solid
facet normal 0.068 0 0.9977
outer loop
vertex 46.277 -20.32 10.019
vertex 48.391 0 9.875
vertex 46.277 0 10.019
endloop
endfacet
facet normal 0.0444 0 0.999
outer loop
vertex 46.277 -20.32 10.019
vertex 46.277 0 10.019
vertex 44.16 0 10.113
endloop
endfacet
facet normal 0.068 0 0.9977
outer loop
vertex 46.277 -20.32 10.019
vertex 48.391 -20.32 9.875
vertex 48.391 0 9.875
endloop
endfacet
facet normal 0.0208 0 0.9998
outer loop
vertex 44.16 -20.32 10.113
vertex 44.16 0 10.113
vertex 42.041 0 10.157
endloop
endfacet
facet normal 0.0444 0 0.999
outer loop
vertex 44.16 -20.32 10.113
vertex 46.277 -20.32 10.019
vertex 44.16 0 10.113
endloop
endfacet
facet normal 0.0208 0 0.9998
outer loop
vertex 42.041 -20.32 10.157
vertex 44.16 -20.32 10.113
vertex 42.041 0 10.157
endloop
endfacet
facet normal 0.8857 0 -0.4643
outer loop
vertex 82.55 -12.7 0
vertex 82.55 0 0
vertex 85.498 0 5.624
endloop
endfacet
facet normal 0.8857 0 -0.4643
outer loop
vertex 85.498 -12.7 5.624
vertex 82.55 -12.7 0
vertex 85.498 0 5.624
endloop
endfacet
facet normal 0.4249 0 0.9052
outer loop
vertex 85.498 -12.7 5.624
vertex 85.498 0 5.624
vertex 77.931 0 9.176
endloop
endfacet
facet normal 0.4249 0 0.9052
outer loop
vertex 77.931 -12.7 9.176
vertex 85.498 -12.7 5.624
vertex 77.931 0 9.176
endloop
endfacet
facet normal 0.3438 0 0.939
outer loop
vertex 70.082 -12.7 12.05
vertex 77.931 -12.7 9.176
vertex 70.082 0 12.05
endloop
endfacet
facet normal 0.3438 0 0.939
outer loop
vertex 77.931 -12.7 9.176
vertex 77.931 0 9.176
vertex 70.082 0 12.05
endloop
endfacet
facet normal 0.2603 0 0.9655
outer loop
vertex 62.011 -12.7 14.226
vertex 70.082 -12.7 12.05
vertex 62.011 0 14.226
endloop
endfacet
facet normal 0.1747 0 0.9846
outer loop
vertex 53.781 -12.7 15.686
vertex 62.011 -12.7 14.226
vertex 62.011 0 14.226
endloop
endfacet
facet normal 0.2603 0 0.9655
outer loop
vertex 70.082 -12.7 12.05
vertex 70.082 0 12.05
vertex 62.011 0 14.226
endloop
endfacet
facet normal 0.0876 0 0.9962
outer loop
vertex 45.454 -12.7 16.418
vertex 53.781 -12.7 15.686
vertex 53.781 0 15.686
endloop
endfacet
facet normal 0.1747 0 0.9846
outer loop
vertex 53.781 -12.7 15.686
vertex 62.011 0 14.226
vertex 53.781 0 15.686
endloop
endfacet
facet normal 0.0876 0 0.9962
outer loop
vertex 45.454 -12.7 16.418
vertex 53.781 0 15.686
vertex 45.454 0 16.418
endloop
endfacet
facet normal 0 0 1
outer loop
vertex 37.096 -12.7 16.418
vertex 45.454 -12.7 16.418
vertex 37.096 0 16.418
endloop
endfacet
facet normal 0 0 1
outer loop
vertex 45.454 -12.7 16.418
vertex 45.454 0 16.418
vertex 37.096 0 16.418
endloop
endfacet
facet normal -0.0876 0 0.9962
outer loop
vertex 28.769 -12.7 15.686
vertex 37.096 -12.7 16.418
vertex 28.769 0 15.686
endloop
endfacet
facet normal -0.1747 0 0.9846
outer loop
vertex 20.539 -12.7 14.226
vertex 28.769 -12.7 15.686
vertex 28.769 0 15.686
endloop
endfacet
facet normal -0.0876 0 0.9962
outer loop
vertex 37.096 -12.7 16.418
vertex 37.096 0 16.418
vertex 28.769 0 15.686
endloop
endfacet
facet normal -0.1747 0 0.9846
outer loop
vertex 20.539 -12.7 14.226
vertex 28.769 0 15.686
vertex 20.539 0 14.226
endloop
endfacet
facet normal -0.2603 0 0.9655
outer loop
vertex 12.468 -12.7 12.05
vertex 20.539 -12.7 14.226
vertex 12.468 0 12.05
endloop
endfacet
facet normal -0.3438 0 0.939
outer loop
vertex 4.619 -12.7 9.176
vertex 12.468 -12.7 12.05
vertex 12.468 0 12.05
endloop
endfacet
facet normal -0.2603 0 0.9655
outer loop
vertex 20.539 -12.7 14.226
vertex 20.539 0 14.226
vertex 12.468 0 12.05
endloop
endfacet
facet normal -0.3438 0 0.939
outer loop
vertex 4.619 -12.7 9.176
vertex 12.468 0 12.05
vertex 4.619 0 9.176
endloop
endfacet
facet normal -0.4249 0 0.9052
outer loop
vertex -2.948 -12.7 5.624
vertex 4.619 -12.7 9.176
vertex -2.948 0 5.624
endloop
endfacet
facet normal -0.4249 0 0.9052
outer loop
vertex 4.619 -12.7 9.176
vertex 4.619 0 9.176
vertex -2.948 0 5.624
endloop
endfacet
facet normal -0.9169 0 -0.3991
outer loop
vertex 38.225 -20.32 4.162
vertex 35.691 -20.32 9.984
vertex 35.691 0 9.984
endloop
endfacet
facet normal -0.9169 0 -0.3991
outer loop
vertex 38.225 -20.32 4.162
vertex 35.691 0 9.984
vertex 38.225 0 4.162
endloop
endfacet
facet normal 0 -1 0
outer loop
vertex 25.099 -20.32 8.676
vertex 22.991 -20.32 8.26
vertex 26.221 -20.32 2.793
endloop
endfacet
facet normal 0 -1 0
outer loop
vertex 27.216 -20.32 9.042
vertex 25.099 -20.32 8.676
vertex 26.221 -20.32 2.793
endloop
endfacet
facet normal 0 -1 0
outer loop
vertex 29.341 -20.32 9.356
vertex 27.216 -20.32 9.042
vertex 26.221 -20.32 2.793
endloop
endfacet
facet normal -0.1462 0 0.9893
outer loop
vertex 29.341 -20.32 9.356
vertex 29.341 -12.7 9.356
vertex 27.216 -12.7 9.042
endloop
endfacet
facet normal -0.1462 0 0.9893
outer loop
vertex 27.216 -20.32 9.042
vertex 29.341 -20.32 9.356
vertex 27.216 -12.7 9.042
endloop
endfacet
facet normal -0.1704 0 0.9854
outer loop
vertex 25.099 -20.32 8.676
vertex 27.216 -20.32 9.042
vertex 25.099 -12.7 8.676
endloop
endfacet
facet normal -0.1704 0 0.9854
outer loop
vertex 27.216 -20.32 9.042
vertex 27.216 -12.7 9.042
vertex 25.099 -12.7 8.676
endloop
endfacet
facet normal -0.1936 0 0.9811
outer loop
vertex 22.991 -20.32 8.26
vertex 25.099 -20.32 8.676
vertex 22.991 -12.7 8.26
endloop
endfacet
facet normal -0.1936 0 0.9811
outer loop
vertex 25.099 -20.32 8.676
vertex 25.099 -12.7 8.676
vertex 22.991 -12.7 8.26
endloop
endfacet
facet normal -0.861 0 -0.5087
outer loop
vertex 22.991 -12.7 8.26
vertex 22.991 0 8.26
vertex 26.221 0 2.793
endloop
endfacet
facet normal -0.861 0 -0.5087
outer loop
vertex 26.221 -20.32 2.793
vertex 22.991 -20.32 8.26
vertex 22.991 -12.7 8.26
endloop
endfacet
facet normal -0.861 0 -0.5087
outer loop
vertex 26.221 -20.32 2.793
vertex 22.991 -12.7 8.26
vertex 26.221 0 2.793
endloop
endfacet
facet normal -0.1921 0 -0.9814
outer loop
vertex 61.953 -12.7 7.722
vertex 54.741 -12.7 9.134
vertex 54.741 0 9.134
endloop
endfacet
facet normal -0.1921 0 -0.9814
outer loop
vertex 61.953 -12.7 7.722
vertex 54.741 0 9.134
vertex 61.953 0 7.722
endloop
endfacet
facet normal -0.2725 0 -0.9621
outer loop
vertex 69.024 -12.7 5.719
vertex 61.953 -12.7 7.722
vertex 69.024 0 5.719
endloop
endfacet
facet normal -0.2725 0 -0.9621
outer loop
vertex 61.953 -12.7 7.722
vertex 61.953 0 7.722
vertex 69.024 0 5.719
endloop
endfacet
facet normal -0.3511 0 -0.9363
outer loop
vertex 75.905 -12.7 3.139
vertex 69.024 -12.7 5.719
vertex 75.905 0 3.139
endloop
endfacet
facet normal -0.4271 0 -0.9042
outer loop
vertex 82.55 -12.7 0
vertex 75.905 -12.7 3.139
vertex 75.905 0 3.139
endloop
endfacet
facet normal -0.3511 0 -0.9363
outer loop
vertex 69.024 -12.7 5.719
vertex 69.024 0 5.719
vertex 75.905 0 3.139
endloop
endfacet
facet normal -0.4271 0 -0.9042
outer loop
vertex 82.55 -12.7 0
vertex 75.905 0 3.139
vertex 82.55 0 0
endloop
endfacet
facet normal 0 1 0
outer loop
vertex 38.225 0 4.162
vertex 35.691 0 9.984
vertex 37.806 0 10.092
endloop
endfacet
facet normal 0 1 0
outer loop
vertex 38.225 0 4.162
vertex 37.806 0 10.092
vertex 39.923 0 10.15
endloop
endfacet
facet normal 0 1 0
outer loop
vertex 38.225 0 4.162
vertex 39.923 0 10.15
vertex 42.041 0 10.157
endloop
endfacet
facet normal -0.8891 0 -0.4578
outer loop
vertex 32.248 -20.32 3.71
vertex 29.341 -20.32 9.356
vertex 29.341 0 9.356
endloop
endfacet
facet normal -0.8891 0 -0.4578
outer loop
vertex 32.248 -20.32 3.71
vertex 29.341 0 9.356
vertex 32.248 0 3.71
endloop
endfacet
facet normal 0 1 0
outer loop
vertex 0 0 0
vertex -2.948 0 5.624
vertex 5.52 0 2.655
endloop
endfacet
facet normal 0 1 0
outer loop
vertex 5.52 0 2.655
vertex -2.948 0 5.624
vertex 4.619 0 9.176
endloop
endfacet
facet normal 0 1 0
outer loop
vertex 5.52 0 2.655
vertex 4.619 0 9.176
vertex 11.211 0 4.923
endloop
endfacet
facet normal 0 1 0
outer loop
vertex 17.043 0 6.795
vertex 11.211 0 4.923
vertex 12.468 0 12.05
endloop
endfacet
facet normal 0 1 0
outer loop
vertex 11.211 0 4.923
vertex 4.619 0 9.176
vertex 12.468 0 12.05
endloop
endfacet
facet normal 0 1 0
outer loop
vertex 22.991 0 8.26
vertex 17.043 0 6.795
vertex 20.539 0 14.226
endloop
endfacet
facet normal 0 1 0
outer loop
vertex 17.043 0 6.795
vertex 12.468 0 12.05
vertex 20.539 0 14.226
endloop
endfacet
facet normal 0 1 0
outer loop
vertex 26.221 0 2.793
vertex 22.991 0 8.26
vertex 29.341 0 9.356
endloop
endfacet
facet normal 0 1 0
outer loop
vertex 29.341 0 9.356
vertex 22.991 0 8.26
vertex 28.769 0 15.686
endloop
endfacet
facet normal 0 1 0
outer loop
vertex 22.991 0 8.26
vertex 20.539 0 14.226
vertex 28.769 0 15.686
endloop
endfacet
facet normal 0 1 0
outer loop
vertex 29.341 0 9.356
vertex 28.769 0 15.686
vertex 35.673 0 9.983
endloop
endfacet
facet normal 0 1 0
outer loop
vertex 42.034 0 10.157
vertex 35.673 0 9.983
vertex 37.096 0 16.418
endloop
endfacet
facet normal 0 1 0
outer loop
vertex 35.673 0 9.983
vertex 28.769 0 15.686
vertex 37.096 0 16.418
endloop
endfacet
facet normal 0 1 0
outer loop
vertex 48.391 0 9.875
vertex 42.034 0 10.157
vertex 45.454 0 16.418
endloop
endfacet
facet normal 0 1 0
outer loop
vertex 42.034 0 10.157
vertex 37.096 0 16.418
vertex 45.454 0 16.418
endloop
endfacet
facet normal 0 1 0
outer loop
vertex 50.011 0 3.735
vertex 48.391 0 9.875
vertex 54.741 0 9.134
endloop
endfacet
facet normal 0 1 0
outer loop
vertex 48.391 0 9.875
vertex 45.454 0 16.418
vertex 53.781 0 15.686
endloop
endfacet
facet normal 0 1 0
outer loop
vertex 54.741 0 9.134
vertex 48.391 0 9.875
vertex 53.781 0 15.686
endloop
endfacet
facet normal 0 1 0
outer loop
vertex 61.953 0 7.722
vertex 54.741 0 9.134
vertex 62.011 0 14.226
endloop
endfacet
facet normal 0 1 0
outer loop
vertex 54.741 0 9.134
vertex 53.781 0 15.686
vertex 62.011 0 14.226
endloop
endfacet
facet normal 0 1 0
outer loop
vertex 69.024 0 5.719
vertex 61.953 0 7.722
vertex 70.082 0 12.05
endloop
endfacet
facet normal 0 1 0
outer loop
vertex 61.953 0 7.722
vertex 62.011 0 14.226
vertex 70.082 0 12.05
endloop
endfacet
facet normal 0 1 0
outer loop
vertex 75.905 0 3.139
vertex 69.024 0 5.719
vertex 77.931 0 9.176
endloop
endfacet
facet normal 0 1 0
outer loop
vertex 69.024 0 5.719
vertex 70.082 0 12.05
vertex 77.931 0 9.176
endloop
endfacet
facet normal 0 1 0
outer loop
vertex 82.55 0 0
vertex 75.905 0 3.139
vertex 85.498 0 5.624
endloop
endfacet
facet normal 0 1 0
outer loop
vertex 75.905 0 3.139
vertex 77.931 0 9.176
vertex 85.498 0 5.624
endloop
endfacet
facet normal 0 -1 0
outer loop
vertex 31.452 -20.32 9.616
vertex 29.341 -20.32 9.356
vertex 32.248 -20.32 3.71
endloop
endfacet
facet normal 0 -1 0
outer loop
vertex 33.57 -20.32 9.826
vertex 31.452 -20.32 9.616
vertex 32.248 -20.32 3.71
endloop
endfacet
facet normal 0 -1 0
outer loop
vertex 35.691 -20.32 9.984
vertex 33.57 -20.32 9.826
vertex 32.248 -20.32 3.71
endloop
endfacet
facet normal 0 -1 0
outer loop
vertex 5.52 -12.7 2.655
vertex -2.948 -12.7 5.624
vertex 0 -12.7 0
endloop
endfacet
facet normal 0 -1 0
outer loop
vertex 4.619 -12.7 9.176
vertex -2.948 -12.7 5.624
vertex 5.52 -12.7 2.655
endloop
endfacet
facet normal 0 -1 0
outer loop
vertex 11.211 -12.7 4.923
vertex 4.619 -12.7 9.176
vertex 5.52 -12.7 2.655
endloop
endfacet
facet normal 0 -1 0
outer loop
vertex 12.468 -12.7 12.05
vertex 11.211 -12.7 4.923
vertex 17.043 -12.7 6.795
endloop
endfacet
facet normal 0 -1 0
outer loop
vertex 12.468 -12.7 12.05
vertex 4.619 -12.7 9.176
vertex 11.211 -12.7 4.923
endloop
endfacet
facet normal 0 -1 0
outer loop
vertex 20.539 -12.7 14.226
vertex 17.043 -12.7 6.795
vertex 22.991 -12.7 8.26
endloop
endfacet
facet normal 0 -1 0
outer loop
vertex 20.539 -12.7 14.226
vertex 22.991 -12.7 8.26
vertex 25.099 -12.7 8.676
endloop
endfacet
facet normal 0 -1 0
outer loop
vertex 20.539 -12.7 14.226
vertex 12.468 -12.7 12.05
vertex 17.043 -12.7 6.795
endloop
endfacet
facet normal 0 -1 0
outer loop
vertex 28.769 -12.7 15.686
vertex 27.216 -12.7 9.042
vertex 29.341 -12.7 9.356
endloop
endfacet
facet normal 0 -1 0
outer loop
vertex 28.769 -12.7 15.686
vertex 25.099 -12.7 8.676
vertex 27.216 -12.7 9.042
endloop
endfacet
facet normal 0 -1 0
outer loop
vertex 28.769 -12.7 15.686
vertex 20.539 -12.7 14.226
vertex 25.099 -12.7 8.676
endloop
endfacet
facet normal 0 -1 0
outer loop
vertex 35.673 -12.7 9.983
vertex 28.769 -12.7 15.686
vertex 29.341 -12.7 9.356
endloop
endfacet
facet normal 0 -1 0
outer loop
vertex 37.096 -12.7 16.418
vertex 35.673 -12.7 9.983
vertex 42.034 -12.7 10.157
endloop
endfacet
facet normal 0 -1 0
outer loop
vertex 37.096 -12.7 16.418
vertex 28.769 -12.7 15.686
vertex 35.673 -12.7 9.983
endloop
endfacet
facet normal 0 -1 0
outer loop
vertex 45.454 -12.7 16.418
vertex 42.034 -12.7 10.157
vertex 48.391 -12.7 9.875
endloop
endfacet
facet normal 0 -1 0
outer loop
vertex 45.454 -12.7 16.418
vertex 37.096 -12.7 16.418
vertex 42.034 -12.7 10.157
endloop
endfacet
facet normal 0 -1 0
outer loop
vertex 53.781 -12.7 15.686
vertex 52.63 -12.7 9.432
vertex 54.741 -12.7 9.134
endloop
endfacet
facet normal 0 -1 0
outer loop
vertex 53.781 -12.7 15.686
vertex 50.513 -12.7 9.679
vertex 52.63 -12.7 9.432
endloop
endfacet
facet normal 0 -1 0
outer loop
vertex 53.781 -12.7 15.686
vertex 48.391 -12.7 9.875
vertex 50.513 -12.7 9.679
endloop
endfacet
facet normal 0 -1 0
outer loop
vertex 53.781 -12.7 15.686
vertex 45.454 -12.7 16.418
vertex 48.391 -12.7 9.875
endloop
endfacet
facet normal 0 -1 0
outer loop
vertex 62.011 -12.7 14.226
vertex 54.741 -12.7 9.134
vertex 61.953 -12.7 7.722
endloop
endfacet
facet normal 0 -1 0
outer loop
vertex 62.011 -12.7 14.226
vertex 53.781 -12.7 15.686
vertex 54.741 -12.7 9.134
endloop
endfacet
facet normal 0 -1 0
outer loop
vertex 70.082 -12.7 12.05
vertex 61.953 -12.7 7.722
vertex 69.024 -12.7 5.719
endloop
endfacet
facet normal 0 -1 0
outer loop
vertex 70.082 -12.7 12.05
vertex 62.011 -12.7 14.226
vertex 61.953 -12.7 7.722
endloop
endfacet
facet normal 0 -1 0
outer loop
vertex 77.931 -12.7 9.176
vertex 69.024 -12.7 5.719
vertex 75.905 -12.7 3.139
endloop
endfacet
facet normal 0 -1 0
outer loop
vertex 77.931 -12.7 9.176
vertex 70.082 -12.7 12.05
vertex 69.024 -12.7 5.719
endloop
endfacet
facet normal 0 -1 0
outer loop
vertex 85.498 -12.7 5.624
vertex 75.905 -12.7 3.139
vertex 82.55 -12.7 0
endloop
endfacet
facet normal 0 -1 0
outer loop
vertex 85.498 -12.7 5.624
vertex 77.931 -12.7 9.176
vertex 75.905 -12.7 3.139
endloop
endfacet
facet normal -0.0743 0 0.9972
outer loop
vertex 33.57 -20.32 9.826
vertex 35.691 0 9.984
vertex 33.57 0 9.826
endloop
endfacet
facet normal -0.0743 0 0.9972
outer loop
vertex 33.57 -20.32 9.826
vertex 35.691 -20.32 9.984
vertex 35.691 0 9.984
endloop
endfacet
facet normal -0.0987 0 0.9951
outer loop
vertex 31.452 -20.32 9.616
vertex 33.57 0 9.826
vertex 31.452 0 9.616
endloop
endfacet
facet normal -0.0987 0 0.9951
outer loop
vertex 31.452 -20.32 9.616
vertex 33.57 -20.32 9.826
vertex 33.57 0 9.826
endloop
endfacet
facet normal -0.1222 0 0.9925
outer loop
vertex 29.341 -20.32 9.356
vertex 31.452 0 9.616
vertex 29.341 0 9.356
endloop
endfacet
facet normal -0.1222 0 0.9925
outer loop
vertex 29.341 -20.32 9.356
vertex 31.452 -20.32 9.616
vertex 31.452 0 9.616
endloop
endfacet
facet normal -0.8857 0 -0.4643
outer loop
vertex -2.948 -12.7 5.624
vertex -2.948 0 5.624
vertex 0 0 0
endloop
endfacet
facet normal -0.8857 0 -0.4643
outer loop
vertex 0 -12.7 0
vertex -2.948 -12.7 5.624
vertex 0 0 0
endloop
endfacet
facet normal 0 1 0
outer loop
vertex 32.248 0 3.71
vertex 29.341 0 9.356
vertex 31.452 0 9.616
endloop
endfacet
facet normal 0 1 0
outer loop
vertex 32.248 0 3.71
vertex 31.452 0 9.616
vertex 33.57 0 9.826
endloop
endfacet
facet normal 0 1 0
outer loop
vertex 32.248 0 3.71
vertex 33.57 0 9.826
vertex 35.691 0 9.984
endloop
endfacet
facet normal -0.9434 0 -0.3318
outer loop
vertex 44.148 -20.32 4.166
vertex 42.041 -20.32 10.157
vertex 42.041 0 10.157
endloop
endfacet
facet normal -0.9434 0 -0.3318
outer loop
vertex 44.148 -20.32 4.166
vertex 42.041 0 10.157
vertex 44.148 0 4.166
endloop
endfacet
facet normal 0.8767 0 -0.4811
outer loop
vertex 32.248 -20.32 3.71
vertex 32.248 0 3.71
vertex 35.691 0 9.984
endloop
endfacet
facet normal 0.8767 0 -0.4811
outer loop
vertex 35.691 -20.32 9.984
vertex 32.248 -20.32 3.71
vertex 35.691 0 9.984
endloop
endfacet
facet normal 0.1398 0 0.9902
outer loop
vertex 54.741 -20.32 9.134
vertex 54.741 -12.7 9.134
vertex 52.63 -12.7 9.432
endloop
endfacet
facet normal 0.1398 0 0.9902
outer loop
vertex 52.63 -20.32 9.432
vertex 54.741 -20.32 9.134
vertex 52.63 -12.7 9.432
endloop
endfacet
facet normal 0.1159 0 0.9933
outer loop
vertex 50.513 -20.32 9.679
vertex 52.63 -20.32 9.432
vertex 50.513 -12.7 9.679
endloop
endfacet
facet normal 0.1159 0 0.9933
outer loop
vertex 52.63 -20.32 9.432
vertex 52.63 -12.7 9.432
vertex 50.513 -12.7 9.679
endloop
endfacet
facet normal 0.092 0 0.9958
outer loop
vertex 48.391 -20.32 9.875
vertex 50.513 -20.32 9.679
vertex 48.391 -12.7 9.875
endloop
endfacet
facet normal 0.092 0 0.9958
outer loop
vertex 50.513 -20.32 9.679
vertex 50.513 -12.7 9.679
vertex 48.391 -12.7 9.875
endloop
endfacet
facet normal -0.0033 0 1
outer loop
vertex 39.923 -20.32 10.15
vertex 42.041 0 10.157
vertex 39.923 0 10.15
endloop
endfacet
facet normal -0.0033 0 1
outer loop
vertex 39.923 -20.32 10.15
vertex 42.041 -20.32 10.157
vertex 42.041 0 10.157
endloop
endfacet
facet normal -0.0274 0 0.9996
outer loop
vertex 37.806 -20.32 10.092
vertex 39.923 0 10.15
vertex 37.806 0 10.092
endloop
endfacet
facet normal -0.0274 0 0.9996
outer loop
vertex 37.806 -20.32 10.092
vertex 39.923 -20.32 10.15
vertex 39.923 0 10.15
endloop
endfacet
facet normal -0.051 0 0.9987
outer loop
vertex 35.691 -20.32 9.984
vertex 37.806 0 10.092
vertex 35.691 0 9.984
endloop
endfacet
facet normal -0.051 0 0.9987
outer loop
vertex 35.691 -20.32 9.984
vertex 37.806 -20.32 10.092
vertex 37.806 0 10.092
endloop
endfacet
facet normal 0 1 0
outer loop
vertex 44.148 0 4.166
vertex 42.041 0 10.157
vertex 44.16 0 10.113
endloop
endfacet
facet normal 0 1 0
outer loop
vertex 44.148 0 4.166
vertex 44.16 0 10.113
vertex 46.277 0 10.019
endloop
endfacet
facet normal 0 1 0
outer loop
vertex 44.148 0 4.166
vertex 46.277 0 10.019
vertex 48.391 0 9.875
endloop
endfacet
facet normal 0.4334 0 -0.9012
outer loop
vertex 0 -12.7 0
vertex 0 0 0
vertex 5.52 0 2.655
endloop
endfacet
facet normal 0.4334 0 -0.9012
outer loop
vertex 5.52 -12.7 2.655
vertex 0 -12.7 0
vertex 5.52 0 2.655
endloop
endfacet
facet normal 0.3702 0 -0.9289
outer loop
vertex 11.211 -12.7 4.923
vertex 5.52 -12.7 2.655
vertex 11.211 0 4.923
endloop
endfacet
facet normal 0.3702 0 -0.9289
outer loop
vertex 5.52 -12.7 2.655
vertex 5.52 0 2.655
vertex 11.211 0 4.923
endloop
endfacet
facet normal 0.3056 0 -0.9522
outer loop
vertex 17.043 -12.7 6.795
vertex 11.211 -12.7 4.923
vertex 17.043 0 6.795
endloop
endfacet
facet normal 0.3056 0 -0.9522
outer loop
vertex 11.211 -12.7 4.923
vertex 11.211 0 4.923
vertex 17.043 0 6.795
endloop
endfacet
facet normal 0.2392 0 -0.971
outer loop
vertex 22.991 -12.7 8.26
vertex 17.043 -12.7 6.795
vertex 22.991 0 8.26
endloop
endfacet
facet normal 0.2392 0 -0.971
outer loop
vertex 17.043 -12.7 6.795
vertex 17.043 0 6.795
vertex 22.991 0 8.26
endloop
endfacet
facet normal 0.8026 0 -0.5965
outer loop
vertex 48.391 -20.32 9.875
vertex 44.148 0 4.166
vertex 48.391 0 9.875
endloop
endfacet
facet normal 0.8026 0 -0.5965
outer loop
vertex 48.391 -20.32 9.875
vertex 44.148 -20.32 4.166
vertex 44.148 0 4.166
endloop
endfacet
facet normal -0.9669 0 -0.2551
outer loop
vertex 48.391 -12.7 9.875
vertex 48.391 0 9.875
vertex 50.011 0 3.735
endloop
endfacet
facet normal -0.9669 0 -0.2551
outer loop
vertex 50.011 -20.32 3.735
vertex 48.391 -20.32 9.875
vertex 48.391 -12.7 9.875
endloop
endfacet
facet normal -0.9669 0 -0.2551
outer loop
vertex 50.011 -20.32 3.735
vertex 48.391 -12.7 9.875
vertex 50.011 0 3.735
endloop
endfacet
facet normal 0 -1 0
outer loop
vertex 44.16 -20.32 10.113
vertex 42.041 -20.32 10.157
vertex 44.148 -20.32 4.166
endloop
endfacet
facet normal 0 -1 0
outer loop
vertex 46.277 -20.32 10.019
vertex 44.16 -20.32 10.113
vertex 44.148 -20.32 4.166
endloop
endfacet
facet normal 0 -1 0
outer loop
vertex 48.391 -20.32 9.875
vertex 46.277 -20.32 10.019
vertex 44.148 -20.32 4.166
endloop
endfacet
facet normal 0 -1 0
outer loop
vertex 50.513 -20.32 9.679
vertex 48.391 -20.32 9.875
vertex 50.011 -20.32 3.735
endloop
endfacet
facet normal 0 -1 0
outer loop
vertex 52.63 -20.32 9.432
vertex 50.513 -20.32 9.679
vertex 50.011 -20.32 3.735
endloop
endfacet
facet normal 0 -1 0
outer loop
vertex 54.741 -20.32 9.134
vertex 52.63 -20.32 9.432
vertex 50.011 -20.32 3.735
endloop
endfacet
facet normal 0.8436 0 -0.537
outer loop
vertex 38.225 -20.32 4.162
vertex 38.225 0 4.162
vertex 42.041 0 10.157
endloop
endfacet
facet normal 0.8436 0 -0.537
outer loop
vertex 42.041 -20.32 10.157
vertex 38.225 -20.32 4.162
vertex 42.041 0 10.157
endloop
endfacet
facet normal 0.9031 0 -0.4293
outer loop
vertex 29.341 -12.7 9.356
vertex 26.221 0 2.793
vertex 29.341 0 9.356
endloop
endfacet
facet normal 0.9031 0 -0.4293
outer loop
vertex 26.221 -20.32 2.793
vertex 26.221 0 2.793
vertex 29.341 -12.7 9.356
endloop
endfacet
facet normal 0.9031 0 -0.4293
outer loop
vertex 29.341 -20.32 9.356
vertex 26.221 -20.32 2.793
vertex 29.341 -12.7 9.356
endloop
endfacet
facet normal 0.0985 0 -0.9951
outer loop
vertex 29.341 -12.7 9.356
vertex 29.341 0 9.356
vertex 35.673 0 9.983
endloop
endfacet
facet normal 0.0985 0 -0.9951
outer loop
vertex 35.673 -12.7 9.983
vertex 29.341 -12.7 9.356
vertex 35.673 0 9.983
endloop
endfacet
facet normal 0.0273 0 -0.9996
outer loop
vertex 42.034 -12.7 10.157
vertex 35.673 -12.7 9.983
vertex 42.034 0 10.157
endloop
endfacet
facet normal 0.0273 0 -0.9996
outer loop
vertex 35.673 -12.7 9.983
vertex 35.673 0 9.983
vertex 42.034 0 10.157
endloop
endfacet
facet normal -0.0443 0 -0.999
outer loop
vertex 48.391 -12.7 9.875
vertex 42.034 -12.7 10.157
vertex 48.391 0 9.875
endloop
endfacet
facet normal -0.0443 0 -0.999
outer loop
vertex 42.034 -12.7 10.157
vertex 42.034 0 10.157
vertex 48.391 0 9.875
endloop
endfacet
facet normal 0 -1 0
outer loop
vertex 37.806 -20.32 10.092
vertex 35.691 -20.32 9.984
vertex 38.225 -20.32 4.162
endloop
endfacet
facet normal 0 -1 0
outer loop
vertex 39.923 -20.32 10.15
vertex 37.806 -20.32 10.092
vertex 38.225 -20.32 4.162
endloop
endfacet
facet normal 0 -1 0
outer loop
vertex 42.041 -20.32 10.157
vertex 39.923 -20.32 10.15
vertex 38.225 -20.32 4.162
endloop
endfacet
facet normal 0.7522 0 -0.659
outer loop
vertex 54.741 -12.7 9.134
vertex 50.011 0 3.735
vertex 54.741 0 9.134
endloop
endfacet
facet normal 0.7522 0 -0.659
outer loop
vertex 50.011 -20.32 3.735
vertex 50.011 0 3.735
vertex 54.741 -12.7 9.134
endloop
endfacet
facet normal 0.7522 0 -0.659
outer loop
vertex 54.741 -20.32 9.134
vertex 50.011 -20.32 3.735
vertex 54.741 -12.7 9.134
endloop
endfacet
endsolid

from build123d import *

# Parameters (mm, degrees)
F1_DEPTH      = 12.7
F3_DEPTH      = 7.62
F3_DEPTH_BACK = 12.7


with BuildPart() as f1:
    # F0 (on Front) → F1 (new body)
    with BuildSketch(Plane.XZ):
        with BuildLine():
            Line((-2.947556559, 5.6244480686), (0, 0))
            ThreePointArc((0, 0), (41.275, 10.16), (82.55, 0))
            Line((82.55, 0), (85.497556559, 5.6244480686))
            ThreePointArc((85.497556559, 5.6244480686), (41.275, 16.5100004524), (-2.947556559, 5.6244480686))
        make_face()
    extrude(amount=F1_DEPTH)

    # F2 (on face) → F3, piece 4 (join, two sides)
    with BuildSketch(Plane.XZ.offset(12.7)) as f3_4_sk:
        with BuildLine():
            ThreePointArc((29.3410407992, 9.35553079), (26.156112774, 8.8652546041), (22.9910407992, 8.2598979669))
            Line((22.9910407992, 8.2598979669), (26.2207533036, 2.7925899328))
            Line((26.2207533036, 2.7925899328), (29.3410407992, 9.35553079))
        make_face()
        with BuildLine():
            ThreePointArc((54.7410407992, 9.1344356868), (51.5726966653, 9.561705466), (48.3910407992, 9.8748028385))
            Line((48.3910407992, 9.8748028385), (50.0112283643, 3.7349744815))
            Line((50.0112283643, 3.7349744815), (54.7410407992, 9.1344356868))
        make_face()
    extrude(amount=F3_DEPTH)
    extrude(f3_4_sk.sketch, amount=-F3_DEPTH_BACK)


with BuildPart() as f3:
    # F2 (on face) → F3 (new body, two sides)
    with BuildSketch(Plane.XZ.offset(12.7)) as f3_sk:
        with BuildLine():
            ThreePointArc((35.6910407992, 9.9844969832), (32.5103969914, 9.7269933877), (29.3410407992, 9.35553079))
            Line((29.3410407992, 9.35553079), (32.2480694866, 3.7100295535))
            Line((32.2480694866, 3.7100295535), (35.6910407992, 9.9844969832))
        make_face()
    extrude(amount=F3_DEPTH)
    extrude(f3_sk.sketch, amount=-F3_DEPTH_BACK)


with BuildPart() as f3b:
    # F2 (on face) → F3, piece 2 (new body, two sides)
    with BuildSketch(Plane.XZ.offset(12.7)) as f3_2_sk:
        with BuildLine():
            ThreePointArc((42.0410407992, 10.1567002338), (38.8645025574, 10.1273213224), (35.6910407992, 9.9844969832))
            Line((35.6910407992, 9.9844969832), (38.2253531935, 4.1621468831))
            Line((38.2253531935, 4.1621468831), (42.0410407992, 10.1567002338))
        make_face()
    extrude(amount=F3_DEPTH)
    extrude(f3_2_sk.sketch, amount=-F3_DEPTH_BACK)


with BuildPart() as f3c:
    # F2 (on face) → F3, piece 3 (new body, two sides)
    with BuildSketch(Plane.XZ.offset(12.7)) as f3_3_sk:
        with BuildLine():
            ThreePointArc((48.3910407992, 9.8748028385), (45.2185604619, 10.0725092719), (42.0410407992, 10.1567002338))
            Line((42.0410407992, 10.1567002338), (44.1476118764, 4.1663030602))
            Line((44.1476118764, 4.1663030602), (48.3910407992, 9.8748028385))
        make_face()
    extrude(amount=F3_DEPTH)
    extrude(f3_3_sk.sketch, amount=-F3_DEPTH_BACK)


solid = Compound([f1.part, f3.part, f3b.part, f3c.part])
